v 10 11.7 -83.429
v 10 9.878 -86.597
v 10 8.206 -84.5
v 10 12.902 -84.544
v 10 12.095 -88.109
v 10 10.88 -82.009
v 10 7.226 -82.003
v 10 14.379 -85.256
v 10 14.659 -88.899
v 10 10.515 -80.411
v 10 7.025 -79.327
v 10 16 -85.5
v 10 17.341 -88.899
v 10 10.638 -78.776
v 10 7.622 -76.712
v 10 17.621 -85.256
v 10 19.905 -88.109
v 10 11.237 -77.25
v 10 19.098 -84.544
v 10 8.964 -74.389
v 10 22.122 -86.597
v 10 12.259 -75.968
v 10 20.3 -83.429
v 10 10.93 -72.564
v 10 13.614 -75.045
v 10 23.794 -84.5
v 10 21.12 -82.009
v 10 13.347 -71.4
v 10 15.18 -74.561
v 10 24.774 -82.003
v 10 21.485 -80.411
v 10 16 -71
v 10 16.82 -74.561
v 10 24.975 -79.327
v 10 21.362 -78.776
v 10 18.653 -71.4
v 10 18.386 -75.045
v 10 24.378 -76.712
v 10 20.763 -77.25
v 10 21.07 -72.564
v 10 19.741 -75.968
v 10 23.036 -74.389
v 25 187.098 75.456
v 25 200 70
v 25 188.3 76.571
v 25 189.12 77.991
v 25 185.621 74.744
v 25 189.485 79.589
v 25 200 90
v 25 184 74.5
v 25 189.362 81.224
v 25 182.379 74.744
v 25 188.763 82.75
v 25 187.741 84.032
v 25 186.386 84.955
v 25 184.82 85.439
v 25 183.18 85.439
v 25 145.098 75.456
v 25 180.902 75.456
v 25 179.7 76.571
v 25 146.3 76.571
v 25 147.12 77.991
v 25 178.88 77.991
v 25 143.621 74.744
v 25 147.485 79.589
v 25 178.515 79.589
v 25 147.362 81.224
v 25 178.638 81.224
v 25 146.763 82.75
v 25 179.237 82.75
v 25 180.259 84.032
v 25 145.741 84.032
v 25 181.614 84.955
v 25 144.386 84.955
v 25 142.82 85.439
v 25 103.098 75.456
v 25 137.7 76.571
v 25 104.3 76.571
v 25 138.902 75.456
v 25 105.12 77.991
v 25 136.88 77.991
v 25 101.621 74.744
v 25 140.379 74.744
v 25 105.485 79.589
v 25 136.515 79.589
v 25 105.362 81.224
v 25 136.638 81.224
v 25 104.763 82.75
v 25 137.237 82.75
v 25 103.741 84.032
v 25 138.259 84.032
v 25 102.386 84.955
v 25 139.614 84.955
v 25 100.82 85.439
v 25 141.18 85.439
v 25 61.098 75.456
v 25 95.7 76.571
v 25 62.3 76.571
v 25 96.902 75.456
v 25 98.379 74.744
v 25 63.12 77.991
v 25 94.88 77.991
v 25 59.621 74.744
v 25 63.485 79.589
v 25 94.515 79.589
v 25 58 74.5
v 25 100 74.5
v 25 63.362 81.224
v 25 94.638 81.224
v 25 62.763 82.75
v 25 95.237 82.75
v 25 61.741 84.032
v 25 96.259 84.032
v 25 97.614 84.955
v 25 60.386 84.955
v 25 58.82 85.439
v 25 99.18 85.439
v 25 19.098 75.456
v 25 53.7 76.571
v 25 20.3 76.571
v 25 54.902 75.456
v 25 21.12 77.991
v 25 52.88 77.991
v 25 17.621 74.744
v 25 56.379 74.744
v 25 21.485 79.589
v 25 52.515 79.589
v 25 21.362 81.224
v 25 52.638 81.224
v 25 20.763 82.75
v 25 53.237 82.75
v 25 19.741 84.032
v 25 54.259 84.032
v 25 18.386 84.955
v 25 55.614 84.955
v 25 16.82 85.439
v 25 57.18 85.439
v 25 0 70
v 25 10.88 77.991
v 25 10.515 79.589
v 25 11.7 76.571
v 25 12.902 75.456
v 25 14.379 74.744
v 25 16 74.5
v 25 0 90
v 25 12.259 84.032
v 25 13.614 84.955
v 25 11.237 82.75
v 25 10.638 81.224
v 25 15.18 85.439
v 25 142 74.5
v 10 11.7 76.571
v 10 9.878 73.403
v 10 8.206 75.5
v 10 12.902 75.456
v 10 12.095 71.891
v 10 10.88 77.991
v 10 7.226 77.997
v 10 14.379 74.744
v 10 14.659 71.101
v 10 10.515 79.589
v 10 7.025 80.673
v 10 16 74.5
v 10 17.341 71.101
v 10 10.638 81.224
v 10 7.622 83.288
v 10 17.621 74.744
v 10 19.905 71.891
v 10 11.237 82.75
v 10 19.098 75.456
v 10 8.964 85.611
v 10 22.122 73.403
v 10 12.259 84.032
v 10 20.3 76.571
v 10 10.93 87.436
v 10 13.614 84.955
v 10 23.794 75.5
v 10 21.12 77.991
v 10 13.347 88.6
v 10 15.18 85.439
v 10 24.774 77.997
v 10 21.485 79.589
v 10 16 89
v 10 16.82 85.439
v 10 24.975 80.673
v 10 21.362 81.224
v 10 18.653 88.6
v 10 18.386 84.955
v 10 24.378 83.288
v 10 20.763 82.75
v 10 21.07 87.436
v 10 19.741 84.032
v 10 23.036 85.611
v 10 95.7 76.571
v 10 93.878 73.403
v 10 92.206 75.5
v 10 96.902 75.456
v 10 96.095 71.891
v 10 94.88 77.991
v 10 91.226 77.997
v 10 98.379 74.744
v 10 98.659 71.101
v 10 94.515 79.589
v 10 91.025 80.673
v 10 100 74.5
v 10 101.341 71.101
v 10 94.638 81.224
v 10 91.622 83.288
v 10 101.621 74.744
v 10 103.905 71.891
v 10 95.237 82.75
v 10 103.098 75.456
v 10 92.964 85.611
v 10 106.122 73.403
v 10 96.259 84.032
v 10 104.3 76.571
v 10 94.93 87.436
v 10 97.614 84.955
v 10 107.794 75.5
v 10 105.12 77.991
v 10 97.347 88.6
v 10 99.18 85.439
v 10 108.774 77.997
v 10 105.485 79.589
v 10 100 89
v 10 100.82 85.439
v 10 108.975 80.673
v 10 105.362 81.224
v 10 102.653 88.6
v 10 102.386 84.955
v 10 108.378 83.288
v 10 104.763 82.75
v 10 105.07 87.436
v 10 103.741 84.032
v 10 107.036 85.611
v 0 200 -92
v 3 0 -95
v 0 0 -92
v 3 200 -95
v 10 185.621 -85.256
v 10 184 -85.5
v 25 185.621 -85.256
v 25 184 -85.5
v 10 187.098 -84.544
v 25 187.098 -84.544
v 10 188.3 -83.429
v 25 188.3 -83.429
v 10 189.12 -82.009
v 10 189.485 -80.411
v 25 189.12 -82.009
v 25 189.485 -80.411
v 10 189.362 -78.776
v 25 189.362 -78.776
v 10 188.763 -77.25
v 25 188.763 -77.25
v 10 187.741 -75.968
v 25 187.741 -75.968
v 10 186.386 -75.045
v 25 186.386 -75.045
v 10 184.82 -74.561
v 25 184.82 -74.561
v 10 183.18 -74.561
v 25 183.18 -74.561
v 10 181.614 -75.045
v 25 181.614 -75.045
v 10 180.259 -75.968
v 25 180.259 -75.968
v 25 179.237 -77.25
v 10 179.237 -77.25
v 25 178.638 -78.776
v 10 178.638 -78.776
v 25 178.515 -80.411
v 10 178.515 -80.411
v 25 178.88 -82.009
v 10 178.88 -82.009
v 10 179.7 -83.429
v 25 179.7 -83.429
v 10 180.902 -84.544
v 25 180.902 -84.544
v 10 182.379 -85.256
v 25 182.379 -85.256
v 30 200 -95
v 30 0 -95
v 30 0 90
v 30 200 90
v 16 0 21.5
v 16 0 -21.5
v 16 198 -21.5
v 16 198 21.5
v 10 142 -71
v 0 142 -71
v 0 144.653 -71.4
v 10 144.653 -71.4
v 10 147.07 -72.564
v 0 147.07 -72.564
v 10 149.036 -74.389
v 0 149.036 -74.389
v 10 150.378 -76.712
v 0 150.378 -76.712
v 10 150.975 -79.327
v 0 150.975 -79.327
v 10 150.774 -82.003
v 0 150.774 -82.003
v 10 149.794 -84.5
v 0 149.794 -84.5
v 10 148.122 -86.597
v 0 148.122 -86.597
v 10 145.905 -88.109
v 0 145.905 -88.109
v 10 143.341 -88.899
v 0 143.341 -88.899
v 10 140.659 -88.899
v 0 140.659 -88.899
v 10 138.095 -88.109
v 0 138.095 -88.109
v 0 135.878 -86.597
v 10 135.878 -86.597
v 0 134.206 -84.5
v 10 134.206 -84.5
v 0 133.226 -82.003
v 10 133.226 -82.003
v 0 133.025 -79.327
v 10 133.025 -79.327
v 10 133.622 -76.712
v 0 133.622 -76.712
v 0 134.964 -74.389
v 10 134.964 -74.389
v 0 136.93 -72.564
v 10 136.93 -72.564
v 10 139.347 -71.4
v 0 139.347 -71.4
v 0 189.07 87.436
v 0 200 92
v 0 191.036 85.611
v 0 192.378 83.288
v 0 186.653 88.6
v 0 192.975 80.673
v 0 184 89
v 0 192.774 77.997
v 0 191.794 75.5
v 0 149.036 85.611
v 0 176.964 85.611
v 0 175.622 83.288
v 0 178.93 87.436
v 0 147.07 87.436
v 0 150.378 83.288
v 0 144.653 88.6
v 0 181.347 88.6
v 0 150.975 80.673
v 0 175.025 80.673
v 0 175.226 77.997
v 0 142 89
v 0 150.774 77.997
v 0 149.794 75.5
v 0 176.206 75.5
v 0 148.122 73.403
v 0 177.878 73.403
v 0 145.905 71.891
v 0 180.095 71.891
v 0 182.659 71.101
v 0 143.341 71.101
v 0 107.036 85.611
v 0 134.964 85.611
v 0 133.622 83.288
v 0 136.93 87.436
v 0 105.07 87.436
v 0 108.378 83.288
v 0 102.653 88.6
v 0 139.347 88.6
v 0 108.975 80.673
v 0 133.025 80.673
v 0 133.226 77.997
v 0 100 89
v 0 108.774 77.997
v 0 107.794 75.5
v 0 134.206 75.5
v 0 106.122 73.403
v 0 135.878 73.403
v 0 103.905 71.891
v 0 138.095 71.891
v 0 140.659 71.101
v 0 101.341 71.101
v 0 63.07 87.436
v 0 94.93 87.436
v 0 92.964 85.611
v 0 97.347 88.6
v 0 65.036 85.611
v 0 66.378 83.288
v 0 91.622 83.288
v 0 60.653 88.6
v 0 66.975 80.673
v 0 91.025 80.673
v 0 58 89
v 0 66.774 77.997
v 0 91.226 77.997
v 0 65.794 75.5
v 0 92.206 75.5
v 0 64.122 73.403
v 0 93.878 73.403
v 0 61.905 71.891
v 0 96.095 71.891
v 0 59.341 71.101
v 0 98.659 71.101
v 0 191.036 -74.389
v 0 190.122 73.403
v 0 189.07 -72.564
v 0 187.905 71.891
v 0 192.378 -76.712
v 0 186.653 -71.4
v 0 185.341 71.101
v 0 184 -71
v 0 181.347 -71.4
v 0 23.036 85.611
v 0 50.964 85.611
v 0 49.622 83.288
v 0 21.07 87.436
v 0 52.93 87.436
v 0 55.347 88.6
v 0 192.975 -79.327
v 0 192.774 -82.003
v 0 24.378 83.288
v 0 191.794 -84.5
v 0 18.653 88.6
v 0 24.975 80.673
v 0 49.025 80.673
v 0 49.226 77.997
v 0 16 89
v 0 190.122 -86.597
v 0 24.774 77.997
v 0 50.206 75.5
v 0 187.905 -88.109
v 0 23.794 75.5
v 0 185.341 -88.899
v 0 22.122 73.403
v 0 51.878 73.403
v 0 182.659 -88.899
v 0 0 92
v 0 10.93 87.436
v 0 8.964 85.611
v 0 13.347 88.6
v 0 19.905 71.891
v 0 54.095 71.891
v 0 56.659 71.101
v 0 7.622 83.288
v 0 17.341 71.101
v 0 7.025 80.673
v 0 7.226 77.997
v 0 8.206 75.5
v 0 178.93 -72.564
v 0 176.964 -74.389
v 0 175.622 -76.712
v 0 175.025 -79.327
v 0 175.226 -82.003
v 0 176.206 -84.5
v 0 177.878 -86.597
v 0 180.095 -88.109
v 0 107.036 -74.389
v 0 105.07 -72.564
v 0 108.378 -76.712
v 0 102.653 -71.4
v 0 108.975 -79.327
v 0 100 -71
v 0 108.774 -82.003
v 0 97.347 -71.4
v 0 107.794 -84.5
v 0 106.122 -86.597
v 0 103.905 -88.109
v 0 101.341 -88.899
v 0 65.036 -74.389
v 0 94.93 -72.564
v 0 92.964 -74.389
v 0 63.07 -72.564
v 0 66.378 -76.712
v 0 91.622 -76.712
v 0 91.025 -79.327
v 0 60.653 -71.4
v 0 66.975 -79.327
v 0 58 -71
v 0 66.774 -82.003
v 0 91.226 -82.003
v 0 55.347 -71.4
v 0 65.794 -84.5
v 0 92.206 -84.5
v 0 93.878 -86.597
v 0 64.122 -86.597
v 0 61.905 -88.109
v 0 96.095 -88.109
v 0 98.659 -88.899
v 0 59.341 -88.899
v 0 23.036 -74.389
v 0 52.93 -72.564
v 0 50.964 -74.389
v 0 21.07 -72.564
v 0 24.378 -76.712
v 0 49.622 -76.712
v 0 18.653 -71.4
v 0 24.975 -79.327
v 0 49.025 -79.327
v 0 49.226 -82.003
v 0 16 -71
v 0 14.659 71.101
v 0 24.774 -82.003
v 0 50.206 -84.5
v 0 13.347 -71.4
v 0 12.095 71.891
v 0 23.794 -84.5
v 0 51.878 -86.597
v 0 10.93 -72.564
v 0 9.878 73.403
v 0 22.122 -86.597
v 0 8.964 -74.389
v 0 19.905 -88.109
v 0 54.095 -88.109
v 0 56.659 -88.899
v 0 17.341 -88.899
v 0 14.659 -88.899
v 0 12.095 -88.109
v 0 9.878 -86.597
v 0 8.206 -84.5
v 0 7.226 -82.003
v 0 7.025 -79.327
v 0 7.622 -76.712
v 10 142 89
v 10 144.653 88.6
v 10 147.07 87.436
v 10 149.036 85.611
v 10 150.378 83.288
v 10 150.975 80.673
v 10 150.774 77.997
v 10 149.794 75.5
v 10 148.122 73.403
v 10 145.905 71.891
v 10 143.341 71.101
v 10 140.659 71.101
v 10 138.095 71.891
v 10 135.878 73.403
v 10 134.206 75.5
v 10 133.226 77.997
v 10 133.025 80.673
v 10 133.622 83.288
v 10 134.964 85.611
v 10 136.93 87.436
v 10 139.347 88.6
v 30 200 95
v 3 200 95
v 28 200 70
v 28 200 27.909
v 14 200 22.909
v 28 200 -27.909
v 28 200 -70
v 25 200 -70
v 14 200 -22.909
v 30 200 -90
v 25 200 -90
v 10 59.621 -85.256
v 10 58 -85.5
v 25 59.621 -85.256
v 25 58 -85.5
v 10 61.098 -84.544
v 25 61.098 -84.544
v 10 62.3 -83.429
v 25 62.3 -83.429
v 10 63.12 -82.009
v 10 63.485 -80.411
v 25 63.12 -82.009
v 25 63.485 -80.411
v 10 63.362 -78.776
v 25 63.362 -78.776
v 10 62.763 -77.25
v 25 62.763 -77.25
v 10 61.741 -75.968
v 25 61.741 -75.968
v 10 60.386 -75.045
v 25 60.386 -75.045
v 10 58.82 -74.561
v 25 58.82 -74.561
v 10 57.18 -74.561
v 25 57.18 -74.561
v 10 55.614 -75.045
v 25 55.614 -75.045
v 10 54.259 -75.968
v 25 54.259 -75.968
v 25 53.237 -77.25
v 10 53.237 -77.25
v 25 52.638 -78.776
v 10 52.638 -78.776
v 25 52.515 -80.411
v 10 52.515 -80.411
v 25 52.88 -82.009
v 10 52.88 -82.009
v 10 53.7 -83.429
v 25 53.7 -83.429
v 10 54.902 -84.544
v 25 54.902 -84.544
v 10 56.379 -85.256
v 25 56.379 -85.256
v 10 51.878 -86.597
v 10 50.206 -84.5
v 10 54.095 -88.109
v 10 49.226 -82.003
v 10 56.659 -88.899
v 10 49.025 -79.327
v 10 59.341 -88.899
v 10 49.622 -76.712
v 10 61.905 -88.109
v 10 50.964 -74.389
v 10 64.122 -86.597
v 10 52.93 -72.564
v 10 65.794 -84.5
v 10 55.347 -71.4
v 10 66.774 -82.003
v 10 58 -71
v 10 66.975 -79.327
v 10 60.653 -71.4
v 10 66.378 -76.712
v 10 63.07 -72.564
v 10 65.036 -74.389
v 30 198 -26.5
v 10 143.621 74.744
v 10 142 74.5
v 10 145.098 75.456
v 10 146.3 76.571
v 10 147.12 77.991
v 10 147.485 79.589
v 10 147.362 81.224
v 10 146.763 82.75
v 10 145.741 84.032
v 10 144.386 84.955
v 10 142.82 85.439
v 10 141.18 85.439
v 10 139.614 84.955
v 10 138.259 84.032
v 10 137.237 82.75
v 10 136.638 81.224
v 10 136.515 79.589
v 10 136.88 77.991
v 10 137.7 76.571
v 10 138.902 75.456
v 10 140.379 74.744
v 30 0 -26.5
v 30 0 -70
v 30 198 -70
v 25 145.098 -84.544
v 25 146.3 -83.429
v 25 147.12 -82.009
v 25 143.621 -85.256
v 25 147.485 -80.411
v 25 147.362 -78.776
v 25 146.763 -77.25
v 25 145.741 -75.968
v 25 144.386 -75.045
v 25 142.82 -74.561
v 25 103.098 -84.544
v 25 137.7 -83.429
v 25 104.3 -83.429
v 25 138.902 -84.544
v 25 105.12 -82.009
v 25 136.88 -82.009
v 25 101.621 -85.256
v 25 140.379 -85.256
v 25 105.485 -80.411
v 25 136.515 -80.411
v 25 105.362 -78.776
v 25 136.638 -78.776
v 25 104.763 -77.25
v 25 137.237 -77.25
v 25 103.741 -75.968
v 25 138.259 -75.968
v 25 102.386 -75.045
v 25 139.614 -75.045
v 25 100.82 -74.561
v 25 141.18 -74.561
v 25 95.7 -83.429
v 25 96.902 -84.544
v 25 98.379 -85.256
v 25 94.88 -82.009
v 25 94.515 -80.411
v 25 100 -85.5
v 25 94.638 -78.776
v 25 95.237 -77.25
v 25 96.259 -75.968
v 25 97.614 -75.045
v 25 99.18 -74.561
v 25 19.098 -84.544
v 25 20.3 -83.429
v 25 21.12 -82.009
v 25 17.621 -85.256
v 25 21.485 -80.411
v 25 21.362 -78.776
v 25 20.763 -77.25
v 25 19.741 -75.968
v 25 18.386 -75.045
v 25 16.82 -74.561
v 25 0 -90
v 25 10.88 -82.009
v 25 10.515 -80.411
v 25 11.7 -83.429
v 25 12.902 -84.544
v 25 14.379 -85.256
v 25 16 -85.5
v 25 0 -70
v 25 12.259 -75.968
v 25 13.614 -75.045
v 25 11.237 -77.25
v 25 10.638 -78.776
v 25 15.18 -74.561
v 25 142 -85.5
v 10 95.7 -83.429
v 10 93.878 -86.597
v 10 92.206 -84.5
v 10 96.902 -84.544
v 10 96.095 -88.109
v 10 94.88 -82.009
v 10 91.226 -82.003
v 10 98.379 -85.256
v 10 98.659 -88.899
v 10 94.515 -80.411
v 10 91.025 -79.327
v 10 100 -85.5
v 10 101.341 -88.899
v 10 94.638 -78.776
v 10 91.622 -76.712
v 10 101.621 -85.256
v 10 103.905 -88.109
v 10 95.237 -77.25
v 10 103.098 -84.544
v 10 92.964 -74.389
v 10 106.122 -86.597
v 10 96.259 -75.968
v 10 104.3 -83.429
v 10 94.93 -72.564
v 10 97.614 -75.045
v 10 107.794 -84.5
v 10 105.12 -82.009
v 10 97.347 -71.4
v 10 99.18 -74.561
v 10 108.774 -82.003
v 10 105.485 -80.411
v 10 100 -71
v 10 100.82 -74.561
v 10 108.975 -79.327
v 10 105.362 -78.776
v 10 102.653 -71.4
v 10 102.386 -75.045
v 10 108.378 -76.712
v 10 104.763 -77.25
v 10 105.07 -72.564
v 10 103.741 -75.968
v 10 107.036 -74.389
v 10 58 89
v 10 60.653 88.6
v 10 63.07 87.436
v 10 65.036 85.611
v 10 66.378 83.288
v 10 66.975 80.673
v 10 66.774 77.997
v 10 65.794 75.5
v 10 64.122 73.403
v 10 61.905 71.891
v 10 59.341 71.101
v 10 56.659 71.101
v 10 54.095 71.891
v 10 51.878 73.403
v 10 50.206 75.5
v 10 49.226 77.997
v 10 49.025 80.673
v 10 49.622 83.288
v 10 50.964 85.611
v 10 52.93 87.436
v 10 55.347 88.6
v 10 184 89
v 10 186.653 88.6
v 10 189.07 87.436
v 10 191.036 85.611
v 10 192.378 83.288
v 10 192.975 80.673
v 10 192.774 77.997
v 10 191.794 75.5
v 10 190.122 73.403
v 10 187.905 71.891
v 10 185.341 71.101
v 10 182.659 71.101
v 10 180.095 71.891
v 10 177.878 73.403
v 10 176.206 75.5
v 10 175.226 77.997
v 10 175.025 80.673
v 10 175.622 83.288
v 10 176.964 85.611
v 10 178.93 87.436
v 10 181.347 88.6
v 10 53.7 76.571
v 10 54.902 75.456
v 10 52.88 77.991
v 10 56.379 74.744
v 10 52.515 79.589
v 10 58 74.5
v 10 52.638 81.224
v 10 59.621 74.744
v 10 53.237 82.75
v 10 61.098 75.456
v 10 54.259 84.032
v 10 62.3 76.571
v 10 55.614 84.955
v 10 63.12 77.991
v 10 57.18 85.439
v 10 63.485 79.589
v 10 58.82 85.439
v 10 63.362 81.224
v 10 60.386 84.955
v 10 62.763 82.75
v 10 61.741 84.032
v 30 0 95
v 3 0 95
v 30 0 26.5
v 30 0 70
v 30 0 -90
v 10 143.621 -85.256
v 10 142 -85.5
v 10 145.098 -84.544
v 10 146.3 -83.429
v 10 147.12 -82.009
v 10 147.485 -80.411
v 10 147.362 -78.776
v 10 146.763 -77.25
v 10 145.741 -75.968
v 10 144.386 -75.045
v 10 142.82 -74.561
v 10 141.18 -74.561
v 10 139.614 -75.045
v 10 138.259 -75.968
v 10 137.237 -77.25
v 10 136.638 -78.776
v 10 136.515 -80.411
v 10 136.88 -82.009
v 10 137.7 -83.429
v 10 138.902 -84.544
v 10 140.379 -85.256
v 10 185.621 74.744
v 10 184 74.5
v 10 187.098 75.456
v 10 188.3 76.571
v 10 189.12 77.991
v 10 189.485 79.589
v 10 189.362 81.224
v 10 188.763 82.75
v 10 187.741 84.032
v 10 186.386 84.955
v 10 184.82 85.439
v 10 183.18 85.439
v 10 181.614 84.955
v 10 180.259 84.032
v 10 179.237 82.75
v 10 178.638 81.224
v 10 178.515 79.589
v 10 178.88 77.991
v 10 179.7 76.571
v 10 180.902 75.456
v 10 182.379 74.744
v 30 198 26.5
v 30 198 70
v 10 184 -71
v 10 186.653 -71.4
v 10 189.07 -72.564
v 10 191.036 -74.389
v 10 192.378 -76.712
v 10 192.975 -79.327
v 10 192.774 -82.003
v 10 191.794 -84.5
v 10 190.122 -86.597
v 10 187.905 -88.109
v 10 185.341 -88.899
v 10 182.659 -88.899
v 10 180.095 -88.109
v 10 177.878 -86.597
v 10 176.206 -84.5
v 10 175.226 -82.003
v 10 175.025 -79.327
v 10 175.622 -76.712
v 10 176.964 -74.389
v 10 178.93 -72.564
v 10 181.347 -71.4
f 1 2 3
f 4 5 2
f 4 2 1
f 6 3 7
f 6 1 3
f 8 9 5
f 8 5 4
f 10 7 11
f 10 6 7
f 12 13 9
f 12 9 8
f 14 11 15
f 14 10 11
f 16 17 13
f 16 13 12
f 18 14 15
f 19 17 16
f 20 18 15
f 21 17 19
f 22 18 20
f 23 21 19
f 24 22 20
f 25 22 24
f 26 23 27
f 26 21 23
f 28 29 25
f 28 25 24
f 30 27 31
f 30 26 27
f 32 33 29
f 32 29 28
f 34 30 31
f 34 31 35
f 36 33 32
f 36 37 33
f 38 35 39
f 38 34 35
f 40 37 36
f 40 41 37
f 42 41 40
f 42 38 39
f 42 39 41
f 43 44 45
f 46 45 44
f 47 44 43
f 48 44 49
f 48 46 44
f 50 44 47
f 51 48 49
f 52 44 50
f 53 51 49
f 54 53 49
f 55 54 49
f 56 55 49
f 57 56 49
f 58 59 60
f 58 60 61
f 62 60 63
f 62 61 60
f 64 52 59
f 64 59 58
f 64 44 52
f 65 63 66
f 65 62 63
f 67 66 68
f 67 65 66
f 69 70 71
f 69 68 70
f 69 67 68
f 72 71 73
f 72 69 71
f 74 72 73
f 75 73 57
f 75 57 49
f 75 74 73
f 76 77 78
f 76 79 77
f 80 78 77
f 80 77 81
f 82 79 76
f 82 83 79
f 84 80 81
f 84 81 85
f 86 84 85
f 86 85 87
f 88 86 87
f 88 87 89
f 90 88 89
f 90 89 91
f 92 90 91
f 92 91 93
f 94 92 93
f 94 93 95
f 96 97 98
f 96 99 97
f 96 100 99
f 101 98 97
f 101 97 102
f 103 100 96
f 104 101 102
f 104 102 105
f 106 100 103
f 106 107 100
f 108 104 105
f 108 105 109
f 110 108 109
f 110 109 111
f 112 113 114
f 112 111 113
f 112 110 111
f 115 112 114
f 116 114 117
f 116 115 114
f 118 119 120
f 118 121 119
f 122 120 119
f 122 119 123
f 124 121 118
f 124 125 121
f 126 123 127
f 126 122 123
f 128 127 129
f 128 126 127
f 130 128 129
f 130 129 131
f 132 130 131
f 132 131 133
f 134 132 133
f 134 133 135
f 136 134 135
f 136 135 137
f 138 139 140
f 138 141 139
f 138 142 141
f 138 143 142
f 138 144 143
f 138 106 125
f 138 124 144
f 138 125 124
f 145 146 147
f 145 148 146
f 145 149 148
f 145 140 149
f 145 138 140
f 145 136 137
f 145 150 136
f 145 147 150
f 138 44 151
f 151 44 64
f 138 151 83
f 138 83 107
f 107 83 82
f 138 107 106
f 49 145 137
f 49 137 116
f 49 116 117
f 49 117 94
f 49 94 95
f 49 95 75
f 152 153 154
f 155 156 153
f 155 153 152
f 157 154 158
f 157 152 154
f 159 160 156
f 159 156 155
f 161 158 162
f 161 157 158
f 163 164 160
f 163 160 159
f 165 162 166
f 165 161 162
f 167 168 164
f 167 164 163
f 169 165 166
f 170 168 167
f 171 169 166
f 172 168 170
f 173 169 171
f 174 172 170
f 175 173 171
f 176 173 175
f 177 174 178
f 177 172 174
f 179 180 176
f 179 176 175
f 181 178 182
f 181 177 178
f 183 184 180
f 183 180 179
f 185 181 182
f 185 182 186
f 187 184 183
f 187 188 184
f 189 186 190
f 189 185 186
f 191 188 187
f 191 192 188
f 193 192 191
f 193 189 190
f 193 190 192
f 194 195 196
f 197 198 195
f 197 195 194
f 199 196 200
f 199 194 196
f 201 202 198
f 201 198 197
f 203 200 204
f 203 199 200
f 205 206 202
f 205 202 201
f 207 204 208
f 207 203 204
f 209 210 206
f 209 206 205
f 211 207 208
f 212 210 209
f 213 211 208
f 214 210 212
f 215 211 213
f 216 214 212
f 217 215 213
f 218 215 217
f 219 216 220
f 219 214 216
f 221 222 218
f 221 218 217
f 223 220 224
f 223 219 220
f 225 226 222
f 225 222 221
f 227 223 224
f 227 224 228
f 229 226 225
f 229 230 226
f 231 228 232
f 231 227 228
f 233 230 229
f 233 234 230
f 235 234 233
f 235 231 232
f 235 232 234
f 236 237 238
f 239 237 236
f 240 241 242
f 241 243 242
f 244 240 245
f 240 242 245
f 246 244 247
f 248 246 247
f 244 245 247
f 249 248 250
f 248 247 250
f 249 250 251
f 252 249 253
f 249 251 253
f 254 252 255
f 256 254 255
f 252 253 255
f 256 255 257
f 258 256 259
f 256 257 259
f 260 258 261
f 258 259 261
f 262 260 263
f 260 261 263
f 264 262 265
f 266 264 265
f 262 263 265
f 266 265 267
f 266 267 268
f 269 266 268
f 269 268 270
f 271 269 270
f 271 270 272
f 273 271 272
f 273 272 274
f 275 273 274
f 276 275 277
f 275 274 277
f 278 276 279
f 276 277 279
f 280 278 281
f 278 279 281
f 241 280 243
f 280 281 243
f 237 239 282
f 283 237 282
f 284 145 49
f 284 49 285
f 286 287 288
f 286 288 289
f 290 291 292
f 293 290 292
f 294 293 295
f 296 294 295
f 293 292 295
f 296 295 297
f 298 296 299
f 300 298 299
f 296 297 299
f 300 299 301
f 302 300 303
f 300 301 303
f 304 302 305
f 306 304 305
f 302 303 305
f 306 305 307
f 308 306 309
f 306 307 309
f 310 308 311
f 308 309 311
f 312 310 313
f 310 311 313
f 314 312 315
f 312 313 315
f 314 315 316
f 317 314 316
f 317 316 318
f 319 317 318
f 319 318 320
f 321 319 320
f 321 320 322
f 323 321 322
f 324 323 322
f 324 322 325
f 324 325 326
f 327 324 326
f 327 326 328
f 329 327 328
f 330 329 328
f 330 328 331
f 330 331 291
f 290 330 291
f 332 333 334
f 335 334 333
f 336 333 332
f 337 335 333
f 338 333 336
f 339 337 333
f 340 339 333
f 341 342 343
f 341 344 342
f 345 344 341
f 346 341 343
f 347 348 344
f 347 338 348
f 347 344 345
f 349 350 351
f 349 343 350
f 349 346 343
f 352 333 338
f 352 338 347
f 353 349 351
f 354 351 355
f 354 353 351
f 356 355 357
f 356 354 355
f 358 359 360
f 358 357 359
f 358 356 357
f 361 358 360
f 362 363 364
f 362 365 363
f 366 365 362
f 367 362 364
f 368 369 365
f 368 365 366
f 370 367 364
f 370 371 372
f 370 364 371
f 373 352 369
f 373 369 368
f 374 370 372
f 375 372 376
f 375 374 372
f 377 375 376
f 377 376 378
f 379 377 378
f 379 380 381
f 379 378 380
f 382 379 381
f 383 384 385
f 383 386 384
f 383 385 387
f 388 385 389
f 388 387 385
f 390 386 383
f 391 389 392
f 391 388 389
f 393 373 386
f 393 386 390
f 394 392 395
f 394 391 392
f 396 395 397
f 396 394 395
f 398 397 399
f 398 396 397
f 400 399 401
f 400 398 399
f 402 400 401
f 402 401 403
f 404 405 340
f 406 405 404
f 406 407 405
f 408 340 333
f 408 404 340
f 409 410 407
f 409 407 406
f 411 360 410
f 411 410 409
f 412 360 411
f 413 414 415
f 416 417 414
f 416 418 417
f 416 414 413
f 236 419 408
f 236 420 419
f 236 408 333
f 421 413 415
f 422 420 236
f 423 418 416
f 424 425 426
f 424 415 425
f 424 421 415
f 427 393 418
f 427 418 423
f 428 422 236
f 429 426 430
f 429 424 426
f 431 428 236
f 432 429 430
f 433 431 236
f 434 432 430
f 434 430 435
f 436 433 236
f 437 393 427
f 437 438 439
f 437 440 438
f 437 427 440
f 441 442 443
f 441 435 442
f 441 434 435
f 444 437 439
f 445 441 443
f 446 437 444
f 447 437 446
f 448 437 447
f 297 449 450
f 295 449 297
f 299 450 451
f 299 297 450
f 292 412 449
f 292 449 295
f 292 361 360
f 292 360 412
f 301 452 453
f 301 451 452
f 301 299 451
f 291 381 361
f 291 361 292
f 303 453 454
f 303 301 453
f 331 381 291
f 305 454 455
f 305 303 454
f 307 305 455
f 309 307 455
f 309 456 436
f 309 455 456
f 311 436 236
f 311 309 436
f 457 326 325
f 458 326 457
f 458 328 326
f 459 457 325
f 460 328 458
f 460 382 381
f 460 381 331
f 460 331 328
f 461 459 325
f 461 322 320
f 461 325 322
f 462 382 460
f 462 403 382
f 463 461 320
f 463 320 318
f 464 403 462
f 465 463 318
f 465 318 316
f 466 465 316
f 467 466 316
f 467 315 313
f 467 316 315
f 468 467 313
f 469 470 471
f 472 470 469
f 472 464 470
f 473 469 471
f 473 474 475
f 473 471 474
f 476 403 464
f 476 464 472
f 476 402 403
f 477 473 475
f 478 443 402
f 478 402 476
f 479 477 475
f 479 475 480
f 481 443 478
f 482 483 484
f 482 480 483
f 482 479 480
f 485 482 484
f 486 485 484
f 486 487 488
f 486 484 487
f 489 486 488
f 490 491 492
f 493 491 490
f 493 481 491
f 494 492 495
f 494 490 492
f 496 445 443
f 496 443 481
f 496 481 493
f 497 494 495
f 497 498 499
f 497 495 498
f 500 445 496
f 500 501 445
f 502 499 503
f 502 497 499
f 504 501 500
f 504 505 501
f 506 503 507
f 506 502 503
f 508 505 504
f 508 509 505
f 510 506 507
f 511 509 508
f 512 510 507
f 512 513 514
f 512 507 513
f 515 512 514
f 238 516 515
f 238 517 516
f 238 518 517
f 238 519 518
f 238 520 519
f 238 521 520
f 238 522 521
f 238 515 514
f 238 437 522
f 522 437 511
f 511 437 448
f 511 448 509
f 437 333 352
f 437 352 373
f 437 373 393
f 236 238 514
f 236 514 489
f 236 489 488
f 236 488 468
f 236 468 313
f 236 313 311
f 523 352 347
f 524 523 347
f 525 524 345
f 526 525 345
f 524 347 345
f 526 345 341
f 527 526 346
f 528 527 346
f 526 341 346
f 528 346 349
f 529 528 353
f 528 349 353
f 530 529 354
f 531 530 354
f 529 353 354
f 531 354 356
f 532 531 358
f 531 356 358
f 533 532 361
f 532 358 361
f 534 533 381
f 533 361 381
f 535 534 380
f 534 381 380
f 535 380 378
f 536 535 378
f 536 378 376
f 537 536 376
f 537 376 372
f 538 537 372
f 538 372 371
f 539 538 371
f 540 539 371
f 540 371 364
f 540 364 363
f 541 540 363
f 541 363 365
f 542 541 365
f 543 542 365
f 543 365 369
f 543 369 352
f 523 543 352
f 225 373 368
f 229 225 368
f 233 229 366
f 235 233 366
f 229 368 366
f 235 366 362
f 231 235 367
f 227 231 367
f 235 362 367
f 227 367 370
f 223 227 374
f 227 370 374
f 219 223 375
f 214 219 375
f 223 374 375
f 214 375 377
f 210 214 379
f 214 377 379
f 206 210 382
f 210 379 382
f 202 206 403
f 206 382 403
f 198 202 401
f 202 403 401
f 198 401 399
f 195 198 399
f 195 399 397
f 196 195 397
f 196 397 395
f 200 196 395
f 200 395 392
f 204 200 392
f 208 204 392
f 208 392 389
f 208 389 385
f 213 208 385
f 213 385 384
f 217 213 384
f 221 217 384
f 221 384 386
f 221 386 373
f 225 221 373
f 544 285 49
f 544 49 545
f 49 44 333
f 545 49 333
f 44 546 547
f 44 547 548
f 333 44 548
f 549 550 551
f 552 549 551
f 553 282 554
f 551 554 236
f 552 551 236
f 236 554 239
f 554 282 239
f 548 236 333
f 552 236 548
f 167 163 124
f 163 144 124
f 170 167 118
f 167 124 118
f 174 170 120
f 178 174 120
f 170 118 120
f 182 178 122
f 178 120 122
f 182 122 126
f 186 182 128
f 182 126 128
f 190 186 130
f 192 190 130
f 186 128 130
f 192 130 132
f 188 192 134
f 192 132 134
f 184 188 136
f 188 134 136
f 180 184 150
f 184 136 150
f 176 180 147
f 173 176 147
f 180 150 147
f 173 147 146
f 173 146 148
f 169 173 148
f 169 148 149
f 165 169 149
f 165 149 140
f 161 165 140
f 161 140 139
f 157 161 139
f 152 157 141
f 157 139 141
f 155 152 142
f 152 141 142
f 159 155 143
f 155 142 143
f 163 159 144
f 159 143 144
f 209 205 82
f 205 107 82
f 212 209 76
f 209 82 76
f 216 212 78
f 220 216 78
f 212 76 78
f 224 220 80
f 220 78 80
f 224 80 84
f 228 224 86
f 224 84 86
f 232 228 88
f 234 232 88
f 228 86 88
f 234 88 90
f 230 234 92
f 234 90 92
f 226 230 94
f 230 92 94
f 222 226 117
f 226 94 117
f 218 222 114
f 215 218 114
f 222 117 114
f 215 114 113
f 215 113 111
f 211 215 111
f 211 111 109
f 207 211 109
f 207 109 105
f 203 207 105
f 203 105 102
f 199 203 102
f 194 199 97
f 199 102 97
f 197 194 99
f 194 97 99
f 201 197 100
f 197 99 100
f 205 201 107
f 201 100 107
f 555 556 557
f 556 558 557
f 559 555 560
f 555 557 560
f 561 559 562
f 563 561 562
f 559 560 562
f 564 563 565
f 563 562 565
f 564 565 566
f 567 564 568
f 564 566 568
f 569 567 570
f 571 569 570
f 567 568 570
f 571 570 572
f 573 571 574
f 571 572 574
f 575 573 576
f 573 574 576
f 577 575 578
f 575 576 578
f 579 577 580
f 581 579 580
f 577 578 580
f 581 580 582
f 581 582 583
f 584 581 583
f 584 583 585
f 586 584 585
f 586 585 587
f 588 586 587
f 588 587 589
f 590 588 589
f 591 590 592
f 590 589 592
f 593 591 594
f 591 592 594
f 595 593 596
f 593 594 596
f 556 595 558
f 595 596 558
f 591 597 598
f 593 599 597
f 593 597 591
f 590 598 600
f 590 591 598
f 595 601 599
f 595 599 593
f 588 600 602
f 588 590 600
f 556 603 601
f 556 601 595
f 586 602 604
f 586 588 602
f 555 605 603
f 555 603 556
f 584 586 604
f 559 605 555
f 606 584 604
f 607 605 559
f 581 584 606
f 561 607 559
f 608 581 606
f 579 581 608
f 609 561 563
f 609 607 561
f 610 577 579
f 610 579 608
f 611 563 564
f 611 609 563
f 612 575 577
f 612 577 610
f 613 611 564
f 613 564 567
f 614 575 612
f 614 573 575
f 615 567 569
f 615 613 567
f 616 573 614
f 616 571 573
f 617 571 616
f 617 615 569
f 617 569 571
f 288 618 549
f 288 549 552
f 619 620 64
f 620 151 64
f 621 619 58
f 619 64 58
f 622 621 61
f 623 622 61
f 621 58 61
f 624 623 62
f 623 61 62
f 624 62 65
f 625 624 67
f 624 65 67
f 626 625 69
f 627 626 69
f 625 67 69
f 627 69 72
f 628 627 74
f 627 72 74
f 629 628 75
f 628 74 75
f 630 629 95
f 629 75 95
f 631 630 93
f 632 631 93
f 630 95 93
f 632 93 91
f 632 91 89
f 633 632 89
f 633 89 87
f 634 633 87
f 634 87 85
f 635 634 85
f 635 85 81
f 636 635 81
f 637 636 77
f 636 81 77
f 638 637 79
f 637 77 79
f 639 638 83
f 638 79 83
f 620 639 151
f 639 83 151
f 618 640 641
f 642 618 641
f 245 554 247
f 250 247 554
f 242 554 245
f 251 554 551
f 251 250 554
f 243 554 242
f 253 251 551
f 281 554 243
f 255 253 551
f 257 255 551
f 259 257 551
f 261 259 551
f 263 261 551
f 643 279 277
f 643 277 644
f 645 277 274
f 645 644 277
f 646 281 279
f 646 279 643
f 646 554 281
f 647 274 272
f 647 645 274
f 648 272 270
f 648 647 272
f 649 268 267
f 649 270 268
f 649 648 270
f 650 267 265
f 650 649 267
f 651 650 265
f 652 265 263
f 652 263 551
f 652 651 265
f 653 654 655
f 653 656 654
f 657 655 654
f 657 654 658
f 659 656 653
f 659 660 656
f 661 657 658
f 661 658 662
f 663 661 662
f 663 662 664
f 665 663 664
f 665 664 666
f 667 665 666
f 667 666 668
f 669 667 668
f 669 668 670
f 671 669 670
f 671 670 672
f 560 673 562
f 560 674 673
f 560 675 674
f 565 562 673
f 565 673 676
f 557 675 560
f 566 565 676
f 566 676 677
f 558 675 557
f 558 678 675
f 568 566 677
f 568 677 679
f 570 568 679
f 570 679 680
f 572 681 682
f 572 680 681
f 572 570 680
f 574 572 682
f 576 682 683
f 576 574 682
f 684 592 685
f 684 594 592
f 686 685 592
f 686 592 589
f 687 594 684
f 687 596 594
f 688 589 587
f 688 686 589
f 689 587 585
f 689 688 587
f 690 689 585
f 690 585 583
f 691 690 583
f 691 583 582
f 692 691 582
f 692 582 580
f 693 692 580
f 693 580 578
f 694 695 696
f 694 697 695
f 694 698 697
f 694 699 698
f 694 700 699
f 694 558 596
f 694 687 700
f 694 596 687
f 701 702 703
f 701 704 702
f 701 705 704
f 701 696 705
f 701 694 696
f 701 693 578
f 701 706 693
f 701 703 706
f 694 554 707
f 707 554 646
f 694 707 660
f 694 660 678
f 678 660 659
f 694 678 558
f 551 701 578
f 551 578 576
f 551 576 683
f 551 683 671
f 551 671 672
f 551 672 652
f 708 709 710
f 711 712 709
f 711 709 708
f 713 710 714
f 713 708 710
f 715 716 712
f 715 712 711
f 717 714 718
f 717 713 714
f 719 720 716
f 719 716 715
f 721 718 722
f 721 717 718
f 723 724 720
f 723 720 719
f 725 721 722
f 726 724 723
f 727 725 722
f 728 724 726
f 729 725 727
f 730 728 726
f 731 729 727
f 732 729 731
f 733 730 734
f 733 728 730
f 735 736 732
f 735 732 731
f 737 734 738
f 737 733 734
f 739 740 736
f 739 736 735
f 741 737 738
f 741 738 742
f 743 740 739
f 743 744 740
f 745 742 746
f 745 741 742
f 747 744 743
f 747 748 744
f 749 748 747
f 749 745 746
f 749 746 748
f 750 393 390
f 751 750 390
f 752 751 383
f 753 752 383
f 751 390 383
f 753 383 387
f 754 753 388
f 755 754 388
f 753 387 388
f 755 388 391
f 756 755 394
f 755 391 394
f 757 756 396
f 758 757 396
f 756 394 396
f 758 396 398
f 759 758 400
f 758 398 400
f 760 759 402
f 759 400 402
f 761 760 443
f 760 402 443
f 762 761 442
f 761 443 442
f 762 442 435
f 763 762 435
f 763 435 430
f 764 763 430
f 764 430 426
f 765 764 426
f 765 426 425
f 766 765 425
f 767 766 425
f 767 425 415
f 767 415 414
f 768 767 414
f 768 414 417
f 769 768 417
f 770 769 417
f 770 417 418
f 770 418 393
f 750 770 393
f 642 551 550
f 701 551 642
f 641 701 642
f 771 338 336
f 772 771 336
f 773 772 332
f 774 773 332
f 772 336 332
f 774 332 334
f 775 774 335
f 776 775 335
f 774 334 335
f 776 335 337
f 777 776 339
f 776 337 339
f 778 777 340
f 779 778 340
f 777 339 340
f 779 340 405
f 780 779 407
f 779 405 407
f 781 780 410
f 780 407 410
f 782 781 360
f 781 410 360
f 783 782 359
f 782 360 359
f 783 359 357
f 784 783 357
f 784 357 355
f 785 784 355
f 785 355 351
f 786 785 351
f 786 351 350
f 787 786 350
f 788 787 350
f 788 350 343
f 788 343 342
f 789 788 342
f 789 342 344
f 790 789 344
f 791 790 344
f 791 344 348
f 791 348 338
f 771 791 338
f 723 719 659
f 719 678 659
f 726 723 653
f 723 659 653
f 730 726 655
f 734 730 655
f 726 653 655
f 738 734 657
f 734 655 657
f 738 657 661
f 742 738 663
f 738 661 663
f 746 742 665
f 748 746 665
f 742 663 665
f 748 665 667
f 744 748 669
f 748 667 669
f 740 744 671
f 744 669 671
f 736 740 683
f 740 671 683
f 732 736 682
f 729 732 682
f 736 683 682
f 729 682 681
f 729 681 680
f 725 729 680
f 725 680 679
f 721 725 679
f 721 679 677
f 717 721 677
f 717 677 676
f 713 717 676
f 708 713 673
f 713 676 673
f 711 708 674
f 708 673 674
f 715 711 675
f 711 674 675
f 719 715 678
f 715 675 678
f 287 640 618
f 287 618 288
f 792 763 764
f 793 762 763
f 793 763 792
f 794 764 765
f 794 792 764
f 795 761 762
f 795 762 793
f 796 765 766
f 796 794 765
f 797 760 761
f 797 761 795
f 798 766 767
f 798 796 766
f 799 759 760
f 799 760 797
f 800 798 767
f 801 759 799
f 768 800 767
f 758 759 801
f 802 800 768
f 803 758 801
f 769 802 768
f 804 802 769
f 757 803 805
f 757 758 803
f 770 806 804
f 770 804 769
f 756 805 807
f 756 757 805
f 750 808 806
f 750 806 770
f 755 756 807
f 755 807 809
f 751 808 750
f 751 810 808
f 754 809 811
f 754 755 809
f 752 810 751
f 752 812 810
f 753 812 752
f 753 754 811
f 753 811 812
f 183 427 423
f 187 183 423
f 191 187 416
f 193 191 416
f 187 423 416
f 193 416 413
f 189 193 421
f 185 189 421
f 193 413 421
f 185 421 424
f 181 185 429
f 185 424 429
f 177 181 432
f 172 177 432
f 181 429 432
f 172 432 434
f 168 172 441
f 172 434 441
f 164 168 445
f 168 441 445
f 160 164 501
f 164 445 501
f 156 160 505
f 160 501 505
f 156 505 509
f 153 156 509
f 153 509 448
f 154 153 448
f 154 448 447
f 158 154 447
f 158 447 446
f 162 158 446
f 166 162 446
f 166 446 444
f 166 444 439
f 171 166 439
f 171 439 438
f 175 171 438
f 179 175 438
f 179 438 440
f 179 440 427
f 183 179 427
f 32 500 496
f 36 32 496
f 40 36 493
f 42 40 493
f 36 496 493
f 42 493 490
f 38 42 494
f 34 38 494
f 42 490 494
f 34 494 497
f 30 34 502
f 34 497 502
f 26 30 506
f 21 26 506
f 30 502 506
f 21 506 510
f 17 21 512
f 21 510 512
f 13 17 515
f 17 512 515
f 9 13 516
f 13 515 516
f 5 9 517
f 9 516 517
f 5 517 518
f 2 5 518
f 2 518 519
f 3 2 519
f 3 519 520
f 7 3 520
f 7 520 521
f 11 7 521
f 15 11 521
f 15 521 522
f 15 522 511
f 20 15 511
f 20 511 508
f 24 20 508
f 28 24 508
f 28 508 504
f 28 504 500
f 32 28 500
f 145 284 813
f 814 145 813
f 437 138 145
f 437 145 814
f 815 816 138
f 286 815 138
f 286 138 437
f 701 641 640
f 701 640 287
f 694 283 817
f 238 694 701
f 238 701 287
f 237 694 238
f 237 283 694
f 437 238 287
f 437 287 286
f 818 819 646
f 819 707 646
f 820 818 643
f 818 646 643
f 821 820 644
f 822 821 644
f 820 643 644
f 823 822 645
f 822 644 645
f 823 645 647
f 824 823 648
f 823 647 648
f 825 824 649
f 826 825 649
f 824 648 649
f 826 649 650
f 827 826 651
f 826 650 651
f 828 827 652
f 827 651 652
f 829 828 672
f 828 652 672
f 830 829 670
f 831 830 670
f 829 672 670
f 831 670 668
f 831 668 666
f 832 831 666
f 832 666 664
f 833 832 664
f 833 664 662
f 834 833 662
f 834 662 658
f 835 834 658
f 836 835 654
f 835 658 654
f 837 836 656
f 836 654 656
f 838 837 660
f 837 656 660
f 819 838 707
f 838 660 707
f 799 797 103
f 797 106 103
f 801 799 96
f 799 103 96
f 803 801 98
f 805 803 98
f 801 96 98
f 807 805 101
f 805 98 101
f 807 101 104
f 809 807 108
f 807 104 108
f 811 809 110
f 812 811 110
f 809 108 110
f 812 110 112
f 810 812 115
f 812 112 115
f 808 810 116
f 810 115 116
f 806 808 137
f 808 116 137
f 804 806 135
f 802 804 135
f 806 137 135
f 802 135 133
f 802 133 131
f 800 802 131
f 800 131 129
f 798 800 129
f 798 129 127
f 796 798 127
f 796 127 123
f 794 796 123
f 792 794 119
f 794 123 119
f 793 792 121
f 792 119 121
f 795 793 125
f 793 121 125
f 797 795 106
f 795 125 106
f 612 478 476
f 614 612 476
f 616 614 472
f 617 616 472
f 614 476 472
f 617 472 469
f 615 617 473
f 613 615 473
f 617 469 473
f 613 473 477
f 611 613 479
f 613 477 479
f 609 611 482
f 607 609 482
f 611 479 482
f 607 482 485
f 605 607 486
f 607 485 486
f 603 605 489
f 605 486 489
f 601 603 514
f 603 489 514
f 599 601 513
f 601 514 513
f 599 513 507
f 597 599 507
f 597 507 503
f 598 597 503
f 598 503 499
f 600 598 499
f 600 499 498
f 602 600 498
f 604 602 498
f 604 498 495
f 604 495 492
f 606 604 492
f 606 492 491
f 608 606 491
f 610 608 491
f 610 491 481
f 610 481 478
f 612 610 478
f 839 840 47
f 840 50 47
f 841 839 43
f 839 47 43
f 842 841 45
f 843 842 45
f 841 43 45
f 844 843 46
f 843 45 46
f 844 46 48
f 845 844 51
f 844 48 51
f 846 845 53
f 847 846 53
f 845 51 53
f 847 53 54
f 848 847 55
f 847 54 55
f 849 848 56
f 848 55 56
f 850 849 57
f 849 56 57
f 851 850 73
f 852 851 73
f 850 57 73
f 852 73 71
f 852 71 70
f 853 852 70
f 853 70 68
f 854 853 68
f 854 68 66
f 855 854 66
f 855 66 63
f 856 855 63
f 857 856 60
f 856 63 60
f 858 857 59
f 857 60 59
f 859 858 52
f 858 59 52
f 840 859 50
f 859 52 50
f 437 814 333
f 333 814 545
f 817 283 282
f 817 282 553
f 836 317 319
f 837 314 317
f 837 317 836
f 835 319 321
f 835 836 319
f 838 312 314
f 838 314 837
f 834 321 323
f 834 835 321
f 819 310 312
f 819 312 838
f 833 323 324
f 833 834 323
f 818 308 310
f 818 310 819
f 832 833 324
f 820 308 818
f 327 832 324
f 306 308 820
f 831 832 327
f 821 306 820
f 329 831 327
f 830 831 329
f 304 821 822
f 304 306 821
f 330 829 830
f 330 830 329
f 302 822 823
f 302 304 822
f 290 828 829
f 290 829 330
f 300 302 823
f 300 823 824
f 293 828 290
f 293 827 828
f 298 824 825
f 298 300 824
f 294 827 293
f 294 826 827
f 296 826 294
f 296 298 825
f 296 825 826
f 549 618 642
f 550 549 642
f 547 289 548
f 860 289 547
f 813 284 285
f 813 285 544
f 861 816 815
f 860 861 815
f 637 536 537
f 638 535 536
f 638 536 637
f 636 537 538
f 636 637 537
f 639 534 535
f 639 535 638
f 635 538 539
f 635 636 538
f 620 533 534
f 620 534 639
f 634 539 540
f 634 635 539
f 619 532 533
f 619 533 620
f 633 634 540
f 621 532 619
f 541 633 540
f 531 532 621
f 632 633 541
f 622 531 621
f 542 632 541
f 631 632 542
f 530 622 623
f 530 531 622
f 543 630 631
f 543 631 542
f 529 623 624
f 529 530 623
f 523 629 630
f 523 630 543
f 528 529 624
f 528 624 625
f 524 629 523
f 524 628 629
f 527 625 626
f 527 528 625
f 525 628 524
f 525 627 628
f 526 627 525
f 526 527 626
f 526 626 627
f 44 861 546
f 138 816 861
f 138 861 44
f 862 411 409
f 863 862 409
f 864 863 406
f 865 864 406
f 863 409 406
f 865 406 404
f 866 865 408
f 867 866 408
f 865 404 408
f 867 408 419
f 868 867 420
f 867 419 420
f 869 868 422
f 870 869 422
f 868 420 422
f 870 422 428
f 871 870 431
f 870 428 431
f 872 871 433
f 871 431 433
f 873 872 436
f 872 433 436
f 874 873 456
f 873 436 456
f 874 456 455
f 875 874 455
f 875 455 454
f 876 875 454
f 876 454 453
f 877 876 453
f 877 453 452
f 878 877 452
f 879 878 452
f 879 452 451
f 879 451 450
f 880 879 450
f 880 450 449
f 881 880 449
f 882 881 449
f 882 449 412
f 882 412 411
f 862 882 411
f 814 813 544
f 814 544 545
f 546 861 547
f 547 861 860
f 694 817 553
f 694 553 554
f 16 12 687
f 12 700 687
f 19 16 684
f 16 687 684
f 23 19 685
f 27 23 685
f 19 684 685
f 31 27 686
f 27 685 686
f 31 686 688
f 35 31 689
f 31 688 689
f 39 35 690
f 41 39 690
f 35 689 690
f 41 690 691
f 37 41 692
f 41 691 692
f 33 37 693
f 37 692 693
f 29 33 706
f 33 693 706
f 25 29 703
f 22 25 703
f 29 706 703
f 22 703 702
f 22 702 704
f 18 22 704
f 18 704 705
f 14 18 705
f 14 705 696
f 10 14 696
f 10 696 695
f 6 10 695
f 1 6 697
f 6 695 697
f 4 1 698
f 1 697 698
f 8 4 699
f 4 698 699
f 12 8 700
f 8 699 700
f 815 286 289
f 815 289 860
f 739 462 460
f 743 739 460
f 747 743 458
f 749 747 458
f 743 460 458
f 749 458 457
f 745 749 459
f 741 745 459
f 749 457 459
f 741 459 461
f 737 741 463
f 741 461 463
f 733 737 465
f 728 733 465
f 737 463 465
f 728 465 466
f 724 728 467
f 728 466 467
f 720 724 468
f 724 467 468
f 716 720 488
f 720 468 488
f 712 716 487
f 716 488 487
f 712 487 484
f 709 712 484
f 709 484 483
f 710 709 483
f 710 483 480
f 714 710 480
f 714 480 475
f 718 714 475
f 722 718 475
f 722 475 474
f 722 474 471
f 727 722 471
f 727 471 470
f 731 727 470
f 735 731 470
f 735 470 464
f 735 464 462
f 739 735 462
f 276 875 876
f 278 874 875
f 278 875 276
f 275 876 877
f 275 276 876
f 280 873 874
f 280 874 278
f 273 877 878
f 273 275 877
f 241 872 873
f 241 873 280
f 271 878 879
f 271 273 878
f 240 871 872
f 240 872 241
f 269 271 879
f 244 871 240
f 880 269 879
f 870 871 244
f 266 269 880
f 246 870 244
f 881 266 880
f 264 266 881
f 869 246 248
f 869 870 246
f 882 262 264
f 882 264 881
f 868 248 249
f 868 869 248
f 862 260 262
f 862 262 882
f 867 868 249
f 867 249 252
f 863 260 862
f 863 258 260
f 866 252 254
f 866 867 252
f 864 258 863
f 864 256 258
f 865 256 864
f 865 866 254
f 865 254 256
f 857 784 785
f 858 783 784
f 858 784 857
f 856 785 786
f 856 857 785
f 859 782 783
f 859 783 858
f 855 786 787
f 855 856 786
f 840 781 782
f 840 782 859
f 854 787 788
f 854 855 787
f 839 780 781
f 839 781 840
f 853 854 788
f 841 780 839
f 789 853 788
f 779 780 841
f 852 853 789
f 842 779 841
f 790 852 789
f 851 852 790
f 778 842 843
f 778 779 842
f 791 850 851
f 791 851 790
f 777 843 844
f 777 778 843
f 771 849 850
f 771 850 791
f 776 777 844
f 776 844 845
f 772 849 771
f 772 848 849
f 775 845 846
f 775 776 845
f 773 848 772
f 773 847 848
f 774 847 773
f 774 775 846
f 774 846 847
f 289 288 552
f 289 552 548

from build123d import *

# Parameters (mm, degrees)
ESTRUSIONE1_DEPTH                                    = 200
M10_LAMATURA_PER_VITE_A_COPERTURA_CILIND_D           = 11
M10_LAMATURA_PER_VITE_A_COPERTURA_CILIND_CBORE_D     = 18
M10_LAMATURA_PER_VITE_A_COPERTURA_CILIND_CBORE_DEPTH = 10
RIPETIZIONE_A_L1_COUNT                               = 5
RIPETIZIONE_A_L1_PITCH                               = 42
RIPETIZIONE_A_L1_COUNT_DIR2                          = 2
RIPETIZIONE_A_L1_PITCH_DIR2                          = 160
SMUSSO1_SIZE                                         = 3
SMUSSO2_SIZE                                         = 2


with BuildPart() as part:
    # Schizzo1 → Estrusione1 (new body)
    with BuildSketch(Plane(origin=(0, 0, 0), x_dir=(1, 0, 0), z_dir=(0, 1, 0))):
        Polygon((0, -95), (0, 95), (30, 95), (30, 90), (25, 90), (25, 70), (30, 70), (30, 66), (30, 26.5), (16, 21.5), (16, -21.5), (30, -26.5), (30, -66), (30, -70), (25, -70), (25, -90), (30, -90), (30, -95), align=None)
    extrude(amount=ESTRUSIONE1_DEPTH)

    # M10 Lamatura per vite a copertura cilindrica esagonale1 (through all)
    with Locations(Plane.ZY):
        with Locations((80, 184)):
            m10_lamatura_per_vite_a_copertura_cilind = CounterBoreHole(M10_LAMATURA_PER_VITE_A_COPERTURA_CILIND_D / 2, M10_LAMATURA_PER_VITE_A_COPERTURA_CILIND_CBORE_D / 2, M10_LAMATURA_PER_VITE_A_COPERTURA_CILIND_CBORE_DEPTH)

    # Ripetizione a L1: M10 Lamatura per vite a copertura cilind 5 × 2
    with Locations(*[(0, -i * RIPETIZIONE_A_L1_PITCH, -j * RIPETIZIONE_A_L1_PITCH_DIR2) for i in range(RIPETIZIONE_A_L1_COUNT) for j in range(RIPETIZIONE_A_L1_COUNT_DIR2) if (i, j) != (0, 0)]):
        add(m10_lamatura_per_vite_a_copertura_cilind, mode=Mode.SUBTRACT)

    # Smusso1
    smusso1_edges = [part.edges().sort_by_distance(p)[0] for p in [
        (0, 100, 95),
        (0, 100, -95),
    ]]
    chamfer(smusso1_edges, length=SMUSSO1_SIZE)

    # Smusso2
    smusso2_edges = [part.edges().sort_by_distance(p)[0] for p in [
        (30, 200, 48.25),
        (23, 200, 24),
        (16, 200, 0),
        (23, 200, -24),
        (30, 200, -48.25),
    ]]
    chamfer(smusso2_edges, length=SMUSSO2_SIZE)


solid = part.part
